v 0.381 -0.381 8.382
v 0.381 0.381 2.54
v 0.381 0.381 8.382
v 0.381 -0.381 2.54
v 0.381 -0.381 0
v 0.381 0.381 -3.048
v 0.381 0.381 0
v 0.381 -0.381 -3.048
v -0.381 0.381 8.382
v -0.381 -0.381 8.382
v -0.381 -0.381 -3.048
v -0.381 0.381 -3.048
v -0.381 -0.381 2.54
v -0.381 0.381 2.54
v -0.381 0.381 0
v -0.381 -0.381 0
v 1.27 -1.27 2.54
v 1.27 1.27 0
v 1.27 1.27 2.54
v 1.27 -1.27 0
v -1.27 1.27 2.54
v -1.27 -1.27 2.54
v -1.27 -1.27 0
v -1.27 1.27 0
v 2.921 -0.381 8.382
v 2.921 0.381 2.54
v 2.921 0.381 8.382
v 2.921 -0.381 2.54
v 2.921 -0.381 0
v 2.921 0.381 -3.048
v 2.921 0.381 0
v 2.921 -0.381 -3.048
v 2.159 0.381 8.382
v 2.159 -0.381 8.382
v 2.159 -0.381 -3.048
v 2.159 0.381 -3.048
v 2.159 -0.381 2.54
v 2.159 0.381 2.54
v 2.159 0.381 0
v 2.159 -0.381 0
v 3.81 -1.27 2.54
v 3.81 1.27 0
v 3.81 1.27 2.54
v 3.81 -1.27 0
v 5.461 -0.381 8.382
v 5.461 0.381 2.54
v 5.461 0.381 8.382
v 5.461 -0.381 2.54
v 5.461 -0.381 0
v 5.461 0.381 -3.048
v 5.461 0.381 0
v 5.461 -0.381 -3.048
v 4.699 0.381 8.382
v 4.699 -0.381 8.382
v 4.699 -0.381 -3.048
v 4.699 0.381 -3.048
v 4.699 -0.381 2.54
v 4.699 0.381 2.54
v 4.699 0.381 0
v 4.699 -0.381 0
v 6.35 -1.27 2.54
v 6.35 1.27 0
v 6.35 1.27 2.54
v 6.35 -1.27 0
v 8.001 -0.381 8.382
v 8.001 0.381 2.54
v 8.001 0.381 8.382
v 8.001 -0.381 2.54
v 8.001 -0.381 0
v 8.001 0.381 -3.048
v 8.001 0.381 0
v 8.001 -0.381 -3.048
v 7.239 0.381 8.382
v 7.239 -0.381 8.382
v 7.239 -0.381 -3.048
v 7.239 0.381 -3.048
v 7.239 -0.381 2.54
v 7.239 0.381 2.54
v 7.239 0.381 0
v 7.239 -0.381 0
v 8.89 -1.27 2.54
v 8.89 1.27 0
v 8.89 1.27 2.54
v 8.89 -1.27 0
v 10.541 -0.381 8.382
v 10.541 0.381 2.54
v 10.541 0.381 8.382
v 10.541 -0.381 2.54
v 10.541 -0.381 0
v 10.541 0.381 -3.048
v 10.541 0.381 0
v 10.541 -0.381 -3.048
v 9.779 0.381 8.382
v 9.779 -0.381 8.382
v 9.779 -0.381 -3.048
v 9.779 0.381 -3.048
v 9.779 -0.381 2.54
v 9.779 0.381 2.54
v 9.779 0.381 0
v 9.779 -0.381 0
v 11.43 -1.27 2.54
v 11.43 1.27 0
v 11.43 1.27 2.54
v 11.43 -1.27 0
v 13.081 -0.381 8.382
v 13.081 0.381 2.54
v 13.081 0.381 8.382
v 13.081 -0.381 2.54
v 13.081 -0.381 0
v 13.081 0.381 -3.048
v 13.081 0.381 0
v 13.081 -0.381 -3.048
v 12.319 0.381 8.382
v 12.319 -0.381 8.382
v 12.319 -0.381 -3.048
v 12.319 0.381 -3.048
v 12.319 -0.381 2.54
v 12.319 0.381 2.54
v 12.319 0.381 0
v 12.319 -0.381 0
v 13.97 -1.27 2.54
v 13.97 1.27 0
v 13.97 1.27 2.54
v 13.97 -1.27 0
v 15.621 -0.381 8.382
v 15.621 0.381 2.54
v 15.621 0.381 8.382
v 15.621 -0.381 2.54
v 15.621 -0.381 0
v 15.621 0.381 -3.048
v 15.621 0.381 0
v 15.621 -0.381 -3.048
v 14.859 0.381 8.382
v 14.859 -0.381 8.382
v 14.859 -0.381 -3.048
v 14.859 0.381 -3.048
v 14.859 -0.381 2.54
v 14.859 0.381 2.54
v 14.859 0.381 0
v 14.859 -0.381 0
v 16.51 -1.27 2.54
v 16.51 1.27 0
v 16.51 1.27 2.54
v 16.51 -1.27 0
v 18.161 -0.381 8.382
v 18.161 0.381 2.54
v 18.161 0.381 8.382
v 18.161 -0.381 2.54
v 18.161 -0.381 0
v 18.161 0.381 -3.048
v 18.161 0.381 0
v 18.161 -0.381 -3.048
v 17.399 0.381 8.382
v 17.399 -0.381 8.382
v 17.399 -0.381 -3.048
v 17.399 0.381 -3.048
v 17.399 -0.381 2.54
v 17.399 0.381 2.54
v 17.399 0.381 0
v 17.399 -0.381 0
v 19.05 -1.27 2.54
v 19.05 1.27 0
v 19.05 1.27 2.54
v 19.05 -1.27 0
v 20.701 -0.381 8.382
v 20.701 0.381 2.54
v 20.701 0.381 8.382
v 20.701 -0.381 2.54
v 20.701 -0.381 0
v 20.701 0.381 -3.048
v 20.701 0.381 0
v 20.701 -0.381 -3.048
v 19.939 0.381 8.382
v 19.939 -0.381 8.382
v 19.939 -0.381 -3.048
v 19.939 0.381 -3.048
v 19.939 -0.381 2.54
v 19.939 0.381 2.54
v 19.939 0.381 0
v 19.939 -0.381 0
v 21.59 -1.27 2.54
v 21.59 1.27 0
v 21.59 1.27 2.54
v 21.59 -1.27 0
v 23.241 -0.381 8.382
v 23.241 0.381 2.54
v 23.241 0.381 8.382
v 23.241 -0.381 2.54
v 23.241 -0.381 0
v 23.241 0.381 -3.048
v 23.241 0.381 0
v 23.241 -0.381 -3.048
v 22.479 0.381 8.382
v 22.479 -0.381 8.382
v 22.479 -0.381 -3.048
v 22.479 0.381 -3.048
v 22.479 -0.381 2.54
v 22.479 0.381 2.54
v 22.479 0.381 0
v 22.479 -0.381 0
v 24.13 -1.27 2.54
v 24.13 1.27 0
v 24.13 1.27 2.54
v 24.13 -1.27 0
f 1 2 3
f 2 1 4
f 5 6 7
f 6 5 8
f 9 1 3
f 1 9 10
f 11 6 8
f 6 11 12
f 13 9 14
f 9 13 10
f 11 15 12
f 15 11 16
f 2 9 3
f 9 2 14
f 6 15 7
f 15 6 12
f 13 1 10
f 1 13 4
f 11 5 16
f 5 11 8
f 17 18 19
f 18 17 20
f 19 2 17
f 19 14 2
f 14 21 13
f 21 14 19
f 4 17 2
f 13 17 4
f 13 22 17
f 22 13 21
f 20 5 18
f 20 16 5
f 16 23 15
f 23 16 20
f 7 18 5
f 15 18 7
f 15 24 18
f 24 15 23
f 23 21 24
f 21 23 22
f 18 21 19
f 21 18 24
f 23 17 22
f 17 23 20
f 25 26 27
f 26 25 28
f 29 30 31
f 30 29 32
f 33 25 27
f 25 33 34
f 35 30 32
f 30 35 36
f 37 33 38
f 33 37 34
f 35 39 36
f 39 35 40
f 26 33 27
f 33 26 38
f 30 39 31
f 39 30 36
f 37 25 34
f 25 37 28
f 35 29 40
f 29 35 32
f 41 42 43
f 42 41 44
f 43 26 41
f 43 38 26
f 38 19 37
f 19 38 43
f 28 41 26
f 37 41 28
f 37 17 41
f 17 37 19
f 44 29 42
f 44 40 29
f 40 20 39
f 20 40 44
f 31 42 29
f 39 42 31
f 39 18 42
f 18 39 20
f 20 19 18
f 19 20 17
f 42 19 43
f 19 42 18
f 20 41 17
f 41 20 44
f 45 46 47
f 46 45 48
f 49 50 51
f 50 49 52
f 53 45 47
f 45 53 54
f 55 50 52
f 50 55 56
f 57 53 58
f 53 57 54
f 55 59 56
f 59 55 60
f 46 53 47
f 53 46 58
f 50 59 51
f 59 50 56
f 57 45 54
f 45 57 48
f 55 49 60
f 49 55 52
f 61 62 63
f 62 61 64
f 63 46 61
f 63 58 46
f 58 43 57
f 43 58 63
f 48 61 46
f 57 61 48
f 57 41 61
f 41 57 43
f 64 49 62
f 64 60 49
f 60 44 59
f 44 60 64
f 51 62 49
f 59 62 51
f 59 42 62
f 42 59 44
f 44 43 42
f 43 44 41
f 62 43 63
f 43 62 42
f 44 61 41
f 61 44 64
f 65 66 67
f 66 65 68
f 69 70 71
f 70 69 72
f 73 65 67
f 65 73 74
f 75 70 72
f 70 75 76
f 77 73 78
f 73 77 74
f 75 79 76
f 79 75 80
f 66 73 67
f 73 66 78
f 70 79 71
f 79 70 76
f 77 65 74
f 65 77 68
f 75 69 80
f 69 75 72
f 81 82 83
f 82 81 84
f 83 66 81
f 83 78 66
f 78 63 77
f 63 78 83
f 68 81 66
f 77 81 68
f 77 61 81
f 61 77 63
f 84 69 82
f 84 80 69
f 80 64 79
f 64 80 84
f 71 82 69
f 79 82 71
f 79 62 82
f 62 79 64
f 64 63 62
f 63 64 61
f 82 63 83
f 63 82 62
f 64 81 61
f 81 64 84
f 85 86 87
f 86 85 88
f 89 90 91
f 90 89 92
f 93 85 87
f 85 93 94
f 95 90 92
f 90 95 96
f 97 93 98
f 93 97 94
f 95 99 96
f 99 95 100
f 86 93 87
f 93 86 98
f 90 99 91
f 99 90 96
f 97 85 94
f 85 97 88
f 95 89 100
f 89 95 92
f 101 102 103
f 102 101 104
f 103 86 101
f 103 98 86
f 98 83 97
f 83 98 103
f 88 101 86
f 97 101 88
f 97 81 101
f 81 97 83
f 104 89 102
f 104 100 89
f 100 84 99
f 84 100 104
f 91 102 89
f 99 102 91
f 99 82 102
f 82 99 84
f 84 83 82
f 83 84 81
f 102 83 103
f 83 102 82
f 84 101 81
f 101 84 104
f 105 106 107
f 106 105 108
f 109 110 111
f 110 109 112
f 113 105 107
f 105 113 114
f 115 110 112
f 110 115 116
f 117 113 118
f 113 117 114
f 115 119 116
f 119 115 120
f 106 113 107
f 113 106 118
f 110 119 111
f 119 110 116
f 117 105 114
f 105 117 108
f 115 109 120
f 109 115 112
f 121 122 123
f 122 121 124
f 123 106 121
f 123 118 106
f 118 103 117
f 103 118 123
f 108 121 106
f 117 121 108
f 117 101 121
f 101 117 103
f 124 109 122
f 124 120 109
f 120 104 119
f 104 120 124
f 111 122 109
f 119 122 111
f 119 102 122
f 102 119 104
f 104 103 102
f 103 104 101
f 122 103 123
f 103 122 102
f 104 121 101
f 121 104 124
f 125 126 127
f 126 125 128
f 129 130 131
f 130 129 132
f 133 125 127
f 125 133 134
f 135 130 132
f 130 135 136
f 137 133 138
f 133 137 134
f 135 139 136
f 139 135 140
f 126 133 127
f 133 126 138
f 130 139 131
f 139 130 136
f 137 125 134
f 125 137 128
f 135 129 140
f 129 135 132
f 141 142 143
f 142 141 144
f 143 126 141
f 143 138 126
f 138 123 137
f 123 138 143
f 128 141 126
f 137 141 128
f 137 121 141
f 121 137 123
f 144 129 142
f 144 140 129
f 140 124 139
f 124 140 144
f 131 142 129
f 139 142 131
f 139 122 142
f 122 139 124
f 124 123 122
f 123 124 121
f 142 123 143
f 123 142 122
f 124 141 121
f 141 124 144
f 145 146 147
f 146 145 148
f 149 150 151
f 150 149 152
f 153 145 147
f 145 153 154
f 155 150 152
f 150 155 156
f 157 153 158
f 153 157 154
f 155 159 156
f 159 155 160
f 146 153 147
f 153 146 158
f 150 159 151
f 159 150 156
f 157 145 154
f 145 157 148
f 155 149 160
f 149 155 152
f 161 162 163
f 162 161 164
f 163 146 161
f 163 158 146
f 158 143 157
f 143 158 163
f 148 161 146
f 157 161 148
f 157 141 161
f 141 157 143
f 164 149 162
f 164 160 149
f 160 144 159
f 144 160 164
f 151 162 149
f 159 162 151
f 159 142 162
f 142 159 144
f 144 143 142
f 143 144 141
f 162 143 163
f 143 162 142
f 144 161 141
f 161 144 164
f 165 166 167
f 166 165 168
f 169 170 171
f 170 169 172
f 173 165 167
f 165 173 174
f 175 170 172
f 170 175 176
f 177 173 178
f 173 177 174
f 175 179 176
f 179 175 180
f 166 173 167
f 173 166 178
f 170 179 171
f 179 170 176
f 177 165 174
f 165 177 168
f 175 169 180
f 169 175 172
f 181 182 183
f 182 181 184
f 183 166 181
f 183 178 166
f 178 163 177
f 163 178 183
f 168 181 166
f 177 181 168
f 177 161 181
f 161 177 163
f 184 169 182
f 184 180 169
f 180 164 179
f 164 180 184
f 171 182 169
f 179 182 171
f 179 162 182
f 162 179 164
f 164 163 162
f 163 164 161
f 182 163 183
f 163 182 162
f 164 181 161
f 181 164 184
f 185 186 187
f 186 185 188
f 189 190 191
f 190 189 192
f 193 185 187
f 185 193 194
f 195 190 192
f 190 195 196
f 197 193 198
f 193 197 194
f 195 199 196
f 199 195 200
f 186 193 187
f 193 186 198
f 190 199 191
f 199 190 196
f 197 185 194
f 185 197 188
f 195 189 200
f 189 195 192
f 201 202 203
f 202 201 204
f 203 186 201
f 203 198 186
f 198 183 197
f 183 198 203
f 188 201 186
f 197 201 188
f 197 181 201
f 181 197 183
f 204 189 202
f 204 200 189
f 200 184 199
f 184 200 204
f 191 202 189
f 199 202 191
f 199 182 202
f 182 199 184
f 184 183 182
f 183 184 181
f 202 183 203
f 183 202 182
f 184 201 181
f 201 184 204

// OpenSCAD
module pin(n){
    millis= 0.0254;
    pin=    30*millis;
    pinH=   450*millis;
    space=  100*millis;
    cut=    10*millis;
    mXY=[   [0,0,0], 
            [0,1,0],
            [1,0,0],
            [1,1,0]]; //mirror XY
for (x=[0:1:n-1], y=[0:1:0]) translate([x*2.54,y*2.54,0]) {
   
    color("gold")
    translate ([-pin/2,-pin/2,-120*millis]) cube([pin,pin,pinH]);    
    color("gray") 
    difference(){
        translate(-[space,space]/2) cube([space,space,space]);
//        for (i=mXY) mirror(i) translate([space,space]/2)cylinder(space,cut,cut,$fn=8);
    }
}
}
pin(10);
